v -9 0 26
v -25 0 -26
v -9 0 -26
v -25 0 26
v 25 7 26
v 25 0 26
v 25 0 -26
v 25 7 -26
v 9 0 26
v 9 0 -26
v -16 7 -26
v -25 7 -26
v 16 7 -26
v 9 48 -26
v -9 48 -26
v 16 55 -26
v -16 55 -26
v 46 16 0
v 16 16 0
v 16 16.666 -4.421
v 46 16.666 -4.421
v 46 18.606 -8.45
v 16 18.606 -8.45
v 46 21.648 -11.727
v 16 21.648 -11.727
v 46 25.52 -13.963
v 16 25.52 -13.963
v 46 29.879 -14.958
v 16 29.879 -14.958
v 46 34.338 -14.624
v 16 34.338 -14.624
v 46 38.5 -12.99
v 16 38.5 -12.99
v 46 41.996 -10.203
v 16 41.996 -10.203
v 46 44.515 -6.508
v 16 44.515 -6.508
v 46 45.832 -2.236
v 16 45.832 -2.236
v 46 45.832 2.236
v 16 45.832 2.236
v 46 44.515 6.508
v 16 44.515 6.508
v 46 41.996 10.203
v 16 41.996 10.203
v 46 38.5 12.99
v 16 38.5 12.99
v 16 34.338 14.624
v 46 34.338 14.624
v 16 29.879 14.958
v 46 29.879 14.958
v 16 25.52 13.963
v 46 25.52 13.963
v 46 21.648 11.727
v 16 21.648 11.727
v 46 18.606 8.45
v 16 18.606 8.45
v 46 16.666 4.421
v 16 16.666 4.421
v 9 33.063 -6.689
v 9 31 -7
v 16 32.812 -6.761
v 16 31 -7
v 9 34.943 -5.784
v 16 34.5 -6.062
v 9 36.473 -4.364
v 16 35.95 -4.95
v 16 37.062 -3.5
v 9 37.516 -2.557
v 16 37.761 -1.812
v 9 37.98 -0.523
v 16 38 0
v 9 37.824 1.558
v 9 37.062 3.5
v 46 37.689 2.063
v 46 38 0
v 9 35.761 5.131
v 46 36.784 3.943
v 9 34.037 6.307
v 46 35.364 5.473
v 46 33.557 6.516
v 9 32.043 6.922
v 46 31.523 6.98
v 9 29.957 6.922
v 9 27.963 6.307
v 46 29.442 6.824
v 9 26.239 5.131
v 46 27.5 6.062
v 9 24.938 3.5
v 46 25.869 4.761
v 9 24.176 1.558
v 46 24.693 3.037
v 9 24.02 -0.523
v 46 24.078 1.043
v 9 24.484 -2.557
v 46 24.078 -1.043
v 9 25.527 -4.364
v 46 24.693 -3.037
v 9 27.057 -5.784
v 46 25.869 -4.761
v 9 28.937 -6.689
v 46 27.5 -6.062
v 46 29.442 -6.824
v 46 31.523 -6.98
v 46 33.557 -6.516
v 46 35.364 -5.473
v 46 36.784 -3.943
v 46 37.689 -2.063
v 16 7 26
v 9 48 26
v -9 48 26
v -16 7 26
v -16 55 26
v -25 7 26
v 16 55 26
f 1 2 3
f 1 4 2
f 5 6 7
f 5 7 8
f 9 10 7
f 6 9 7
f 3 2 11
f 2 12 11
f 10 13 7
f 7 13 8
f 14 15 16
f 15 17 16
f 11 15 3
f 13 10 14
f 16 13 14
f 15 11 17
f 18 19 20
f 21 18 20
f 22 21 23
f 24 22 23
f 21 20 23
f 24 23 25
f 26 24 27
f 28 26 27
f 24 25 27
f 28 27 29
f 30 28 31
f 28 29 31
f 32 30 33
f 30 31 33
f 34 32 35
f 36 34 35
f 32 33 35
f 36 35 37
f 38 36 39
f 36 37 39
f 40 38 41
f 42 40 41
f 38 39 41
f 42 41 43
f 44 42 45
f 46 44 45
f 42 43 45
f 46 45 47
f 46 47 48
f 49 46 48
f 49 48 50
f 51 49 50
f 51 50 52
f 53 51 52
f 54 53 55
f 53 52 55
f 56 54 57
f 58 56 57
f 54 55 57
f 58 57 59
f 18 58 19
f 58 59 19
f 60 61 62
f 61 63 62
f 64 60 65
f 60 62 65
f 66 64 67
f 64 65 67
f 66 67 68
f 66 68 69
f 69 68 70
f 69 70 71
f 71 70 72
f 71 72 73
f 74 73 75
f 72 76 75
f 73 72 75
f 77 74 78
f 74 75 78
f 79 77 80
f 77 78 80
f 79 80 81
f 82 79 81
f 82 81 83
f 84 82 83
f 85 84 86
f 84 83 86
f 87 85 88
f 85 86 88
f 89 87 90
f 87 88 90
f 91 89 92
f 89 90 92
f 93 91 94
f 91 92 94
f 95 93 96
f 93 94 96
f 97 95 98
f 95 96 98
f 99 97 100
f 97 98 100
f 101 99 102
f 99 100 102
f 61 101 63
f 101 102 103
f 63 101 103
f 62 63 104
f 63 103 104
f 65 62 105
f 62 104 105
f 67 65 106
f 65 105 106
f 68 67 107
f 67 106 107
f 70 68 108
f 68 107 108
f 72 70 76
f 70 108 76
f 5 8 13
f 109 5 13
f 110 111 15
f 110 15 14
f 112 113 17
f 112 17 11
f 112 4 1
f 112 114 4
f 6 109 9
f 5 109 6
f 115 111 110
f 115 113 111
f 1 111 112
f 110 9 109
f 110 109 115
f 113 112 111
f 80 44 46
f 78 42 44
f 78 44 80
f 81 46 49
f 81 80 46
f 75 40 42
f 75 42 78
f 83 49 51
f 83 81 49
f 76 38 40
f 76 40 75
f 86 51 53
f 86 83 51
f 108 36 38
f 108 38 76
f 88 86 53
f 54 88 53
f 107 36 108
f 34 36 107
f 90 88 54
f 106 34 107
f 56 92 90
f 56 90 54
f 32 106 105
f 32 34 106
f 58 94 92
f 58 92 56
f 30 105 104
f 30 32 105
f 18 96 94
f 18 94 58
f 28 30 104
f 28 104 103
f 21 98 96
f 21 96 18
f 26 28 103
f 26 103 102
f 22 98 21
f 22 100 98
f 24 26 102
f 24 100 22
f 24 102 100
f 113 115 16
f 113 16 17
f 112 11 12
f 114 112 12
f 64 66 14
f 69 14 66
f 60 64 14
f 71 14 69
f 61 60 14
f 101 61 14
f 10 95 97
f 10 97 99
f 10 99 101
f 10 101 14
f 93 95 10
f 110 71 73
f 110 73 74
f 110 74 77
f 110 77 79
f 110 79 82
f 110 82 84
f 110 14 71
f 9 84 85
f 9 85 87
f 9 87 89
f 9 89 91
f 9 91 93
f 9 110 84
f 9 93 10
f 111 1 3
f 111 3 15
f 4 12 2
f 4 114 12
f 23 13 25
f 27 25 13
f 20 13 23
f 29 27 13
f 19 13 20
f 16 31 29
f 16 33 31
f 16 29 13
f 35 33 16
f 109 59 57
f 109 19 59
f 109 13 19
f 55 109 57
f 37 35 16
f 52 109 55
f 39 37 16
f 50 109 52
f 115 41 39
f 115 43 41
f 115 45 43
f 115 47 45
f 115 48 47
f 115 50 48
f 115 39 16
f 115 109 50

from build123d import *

# Parameters (mm, degrees)
BOSS_EXTRUDE1_DEPTH = 26
SKETCH2_R           = 15
SKETCH2_R_2         = 7
BOSS_EXTRUDE2_DEPTH = 30
CUT_EXTRUDE1_REACH  = 75.362
SKETCH3_R           = 7


with BuildPart() as part:
    # Sketch1 → Boss-Extrude1 (new, symmetric)
    with BuildSketch(Plane.XY):
        Polygon((-25, 0), (-9, 0), (-9, 7), (-9, 48), (9, 48), (9, 7), (9, 0), (25, 0), (25, 7), (16, 7), (16, 48), (16, 55), (-16, 55), (-16, 48), (-16, 7), (-25, 7), align=None)
    extrude(amount=BOSS_EXTRUDE1_DEPTH, both=True)

    # Sketch2 → Boss-Extrude2 (add)
    with BuildSketch(Plane(origin=(16, 0, 0), x_dir=(0, 0, -1), z_dir=(1, 0, 0))):
        with Locations(Location((0, 31, 0), (0, 0, 270))):
            Circle(SKETCH2_R)
        with Locations(Location((0, 31, 0), (0, 0, 90))):
            Circle(SKETCH2_R_2, mode=Mode.SUBTRACT)
    extrude(amount=BOSS_EXTRUDE2_DEPTH)

    # Sketch3 → Cut-Extrude1 (cut, up to next)
    with BuildSketch(Plane(origin=(16, 0, 0), x_dir=(0, 0, -1), z_dir=(1, 0, 0)), mode=Mode.PRIVATE) as cut_extrude1_sk1:
        with Locations((0, 31)):
            Circle(SKETCH3_R)
    cut_extrude1_tool1 = extrude(cut_extrude1_sk1.sketch, amount=-CUT_EXTRUDE1_REACH, mode=Mode.PRIVATE) & part.part
    add(cut_extrude1_tool1.solids().sort_by_distance((16, 31, 0))[0], mode=Mode.SUBTRACT)


solid = part.part
